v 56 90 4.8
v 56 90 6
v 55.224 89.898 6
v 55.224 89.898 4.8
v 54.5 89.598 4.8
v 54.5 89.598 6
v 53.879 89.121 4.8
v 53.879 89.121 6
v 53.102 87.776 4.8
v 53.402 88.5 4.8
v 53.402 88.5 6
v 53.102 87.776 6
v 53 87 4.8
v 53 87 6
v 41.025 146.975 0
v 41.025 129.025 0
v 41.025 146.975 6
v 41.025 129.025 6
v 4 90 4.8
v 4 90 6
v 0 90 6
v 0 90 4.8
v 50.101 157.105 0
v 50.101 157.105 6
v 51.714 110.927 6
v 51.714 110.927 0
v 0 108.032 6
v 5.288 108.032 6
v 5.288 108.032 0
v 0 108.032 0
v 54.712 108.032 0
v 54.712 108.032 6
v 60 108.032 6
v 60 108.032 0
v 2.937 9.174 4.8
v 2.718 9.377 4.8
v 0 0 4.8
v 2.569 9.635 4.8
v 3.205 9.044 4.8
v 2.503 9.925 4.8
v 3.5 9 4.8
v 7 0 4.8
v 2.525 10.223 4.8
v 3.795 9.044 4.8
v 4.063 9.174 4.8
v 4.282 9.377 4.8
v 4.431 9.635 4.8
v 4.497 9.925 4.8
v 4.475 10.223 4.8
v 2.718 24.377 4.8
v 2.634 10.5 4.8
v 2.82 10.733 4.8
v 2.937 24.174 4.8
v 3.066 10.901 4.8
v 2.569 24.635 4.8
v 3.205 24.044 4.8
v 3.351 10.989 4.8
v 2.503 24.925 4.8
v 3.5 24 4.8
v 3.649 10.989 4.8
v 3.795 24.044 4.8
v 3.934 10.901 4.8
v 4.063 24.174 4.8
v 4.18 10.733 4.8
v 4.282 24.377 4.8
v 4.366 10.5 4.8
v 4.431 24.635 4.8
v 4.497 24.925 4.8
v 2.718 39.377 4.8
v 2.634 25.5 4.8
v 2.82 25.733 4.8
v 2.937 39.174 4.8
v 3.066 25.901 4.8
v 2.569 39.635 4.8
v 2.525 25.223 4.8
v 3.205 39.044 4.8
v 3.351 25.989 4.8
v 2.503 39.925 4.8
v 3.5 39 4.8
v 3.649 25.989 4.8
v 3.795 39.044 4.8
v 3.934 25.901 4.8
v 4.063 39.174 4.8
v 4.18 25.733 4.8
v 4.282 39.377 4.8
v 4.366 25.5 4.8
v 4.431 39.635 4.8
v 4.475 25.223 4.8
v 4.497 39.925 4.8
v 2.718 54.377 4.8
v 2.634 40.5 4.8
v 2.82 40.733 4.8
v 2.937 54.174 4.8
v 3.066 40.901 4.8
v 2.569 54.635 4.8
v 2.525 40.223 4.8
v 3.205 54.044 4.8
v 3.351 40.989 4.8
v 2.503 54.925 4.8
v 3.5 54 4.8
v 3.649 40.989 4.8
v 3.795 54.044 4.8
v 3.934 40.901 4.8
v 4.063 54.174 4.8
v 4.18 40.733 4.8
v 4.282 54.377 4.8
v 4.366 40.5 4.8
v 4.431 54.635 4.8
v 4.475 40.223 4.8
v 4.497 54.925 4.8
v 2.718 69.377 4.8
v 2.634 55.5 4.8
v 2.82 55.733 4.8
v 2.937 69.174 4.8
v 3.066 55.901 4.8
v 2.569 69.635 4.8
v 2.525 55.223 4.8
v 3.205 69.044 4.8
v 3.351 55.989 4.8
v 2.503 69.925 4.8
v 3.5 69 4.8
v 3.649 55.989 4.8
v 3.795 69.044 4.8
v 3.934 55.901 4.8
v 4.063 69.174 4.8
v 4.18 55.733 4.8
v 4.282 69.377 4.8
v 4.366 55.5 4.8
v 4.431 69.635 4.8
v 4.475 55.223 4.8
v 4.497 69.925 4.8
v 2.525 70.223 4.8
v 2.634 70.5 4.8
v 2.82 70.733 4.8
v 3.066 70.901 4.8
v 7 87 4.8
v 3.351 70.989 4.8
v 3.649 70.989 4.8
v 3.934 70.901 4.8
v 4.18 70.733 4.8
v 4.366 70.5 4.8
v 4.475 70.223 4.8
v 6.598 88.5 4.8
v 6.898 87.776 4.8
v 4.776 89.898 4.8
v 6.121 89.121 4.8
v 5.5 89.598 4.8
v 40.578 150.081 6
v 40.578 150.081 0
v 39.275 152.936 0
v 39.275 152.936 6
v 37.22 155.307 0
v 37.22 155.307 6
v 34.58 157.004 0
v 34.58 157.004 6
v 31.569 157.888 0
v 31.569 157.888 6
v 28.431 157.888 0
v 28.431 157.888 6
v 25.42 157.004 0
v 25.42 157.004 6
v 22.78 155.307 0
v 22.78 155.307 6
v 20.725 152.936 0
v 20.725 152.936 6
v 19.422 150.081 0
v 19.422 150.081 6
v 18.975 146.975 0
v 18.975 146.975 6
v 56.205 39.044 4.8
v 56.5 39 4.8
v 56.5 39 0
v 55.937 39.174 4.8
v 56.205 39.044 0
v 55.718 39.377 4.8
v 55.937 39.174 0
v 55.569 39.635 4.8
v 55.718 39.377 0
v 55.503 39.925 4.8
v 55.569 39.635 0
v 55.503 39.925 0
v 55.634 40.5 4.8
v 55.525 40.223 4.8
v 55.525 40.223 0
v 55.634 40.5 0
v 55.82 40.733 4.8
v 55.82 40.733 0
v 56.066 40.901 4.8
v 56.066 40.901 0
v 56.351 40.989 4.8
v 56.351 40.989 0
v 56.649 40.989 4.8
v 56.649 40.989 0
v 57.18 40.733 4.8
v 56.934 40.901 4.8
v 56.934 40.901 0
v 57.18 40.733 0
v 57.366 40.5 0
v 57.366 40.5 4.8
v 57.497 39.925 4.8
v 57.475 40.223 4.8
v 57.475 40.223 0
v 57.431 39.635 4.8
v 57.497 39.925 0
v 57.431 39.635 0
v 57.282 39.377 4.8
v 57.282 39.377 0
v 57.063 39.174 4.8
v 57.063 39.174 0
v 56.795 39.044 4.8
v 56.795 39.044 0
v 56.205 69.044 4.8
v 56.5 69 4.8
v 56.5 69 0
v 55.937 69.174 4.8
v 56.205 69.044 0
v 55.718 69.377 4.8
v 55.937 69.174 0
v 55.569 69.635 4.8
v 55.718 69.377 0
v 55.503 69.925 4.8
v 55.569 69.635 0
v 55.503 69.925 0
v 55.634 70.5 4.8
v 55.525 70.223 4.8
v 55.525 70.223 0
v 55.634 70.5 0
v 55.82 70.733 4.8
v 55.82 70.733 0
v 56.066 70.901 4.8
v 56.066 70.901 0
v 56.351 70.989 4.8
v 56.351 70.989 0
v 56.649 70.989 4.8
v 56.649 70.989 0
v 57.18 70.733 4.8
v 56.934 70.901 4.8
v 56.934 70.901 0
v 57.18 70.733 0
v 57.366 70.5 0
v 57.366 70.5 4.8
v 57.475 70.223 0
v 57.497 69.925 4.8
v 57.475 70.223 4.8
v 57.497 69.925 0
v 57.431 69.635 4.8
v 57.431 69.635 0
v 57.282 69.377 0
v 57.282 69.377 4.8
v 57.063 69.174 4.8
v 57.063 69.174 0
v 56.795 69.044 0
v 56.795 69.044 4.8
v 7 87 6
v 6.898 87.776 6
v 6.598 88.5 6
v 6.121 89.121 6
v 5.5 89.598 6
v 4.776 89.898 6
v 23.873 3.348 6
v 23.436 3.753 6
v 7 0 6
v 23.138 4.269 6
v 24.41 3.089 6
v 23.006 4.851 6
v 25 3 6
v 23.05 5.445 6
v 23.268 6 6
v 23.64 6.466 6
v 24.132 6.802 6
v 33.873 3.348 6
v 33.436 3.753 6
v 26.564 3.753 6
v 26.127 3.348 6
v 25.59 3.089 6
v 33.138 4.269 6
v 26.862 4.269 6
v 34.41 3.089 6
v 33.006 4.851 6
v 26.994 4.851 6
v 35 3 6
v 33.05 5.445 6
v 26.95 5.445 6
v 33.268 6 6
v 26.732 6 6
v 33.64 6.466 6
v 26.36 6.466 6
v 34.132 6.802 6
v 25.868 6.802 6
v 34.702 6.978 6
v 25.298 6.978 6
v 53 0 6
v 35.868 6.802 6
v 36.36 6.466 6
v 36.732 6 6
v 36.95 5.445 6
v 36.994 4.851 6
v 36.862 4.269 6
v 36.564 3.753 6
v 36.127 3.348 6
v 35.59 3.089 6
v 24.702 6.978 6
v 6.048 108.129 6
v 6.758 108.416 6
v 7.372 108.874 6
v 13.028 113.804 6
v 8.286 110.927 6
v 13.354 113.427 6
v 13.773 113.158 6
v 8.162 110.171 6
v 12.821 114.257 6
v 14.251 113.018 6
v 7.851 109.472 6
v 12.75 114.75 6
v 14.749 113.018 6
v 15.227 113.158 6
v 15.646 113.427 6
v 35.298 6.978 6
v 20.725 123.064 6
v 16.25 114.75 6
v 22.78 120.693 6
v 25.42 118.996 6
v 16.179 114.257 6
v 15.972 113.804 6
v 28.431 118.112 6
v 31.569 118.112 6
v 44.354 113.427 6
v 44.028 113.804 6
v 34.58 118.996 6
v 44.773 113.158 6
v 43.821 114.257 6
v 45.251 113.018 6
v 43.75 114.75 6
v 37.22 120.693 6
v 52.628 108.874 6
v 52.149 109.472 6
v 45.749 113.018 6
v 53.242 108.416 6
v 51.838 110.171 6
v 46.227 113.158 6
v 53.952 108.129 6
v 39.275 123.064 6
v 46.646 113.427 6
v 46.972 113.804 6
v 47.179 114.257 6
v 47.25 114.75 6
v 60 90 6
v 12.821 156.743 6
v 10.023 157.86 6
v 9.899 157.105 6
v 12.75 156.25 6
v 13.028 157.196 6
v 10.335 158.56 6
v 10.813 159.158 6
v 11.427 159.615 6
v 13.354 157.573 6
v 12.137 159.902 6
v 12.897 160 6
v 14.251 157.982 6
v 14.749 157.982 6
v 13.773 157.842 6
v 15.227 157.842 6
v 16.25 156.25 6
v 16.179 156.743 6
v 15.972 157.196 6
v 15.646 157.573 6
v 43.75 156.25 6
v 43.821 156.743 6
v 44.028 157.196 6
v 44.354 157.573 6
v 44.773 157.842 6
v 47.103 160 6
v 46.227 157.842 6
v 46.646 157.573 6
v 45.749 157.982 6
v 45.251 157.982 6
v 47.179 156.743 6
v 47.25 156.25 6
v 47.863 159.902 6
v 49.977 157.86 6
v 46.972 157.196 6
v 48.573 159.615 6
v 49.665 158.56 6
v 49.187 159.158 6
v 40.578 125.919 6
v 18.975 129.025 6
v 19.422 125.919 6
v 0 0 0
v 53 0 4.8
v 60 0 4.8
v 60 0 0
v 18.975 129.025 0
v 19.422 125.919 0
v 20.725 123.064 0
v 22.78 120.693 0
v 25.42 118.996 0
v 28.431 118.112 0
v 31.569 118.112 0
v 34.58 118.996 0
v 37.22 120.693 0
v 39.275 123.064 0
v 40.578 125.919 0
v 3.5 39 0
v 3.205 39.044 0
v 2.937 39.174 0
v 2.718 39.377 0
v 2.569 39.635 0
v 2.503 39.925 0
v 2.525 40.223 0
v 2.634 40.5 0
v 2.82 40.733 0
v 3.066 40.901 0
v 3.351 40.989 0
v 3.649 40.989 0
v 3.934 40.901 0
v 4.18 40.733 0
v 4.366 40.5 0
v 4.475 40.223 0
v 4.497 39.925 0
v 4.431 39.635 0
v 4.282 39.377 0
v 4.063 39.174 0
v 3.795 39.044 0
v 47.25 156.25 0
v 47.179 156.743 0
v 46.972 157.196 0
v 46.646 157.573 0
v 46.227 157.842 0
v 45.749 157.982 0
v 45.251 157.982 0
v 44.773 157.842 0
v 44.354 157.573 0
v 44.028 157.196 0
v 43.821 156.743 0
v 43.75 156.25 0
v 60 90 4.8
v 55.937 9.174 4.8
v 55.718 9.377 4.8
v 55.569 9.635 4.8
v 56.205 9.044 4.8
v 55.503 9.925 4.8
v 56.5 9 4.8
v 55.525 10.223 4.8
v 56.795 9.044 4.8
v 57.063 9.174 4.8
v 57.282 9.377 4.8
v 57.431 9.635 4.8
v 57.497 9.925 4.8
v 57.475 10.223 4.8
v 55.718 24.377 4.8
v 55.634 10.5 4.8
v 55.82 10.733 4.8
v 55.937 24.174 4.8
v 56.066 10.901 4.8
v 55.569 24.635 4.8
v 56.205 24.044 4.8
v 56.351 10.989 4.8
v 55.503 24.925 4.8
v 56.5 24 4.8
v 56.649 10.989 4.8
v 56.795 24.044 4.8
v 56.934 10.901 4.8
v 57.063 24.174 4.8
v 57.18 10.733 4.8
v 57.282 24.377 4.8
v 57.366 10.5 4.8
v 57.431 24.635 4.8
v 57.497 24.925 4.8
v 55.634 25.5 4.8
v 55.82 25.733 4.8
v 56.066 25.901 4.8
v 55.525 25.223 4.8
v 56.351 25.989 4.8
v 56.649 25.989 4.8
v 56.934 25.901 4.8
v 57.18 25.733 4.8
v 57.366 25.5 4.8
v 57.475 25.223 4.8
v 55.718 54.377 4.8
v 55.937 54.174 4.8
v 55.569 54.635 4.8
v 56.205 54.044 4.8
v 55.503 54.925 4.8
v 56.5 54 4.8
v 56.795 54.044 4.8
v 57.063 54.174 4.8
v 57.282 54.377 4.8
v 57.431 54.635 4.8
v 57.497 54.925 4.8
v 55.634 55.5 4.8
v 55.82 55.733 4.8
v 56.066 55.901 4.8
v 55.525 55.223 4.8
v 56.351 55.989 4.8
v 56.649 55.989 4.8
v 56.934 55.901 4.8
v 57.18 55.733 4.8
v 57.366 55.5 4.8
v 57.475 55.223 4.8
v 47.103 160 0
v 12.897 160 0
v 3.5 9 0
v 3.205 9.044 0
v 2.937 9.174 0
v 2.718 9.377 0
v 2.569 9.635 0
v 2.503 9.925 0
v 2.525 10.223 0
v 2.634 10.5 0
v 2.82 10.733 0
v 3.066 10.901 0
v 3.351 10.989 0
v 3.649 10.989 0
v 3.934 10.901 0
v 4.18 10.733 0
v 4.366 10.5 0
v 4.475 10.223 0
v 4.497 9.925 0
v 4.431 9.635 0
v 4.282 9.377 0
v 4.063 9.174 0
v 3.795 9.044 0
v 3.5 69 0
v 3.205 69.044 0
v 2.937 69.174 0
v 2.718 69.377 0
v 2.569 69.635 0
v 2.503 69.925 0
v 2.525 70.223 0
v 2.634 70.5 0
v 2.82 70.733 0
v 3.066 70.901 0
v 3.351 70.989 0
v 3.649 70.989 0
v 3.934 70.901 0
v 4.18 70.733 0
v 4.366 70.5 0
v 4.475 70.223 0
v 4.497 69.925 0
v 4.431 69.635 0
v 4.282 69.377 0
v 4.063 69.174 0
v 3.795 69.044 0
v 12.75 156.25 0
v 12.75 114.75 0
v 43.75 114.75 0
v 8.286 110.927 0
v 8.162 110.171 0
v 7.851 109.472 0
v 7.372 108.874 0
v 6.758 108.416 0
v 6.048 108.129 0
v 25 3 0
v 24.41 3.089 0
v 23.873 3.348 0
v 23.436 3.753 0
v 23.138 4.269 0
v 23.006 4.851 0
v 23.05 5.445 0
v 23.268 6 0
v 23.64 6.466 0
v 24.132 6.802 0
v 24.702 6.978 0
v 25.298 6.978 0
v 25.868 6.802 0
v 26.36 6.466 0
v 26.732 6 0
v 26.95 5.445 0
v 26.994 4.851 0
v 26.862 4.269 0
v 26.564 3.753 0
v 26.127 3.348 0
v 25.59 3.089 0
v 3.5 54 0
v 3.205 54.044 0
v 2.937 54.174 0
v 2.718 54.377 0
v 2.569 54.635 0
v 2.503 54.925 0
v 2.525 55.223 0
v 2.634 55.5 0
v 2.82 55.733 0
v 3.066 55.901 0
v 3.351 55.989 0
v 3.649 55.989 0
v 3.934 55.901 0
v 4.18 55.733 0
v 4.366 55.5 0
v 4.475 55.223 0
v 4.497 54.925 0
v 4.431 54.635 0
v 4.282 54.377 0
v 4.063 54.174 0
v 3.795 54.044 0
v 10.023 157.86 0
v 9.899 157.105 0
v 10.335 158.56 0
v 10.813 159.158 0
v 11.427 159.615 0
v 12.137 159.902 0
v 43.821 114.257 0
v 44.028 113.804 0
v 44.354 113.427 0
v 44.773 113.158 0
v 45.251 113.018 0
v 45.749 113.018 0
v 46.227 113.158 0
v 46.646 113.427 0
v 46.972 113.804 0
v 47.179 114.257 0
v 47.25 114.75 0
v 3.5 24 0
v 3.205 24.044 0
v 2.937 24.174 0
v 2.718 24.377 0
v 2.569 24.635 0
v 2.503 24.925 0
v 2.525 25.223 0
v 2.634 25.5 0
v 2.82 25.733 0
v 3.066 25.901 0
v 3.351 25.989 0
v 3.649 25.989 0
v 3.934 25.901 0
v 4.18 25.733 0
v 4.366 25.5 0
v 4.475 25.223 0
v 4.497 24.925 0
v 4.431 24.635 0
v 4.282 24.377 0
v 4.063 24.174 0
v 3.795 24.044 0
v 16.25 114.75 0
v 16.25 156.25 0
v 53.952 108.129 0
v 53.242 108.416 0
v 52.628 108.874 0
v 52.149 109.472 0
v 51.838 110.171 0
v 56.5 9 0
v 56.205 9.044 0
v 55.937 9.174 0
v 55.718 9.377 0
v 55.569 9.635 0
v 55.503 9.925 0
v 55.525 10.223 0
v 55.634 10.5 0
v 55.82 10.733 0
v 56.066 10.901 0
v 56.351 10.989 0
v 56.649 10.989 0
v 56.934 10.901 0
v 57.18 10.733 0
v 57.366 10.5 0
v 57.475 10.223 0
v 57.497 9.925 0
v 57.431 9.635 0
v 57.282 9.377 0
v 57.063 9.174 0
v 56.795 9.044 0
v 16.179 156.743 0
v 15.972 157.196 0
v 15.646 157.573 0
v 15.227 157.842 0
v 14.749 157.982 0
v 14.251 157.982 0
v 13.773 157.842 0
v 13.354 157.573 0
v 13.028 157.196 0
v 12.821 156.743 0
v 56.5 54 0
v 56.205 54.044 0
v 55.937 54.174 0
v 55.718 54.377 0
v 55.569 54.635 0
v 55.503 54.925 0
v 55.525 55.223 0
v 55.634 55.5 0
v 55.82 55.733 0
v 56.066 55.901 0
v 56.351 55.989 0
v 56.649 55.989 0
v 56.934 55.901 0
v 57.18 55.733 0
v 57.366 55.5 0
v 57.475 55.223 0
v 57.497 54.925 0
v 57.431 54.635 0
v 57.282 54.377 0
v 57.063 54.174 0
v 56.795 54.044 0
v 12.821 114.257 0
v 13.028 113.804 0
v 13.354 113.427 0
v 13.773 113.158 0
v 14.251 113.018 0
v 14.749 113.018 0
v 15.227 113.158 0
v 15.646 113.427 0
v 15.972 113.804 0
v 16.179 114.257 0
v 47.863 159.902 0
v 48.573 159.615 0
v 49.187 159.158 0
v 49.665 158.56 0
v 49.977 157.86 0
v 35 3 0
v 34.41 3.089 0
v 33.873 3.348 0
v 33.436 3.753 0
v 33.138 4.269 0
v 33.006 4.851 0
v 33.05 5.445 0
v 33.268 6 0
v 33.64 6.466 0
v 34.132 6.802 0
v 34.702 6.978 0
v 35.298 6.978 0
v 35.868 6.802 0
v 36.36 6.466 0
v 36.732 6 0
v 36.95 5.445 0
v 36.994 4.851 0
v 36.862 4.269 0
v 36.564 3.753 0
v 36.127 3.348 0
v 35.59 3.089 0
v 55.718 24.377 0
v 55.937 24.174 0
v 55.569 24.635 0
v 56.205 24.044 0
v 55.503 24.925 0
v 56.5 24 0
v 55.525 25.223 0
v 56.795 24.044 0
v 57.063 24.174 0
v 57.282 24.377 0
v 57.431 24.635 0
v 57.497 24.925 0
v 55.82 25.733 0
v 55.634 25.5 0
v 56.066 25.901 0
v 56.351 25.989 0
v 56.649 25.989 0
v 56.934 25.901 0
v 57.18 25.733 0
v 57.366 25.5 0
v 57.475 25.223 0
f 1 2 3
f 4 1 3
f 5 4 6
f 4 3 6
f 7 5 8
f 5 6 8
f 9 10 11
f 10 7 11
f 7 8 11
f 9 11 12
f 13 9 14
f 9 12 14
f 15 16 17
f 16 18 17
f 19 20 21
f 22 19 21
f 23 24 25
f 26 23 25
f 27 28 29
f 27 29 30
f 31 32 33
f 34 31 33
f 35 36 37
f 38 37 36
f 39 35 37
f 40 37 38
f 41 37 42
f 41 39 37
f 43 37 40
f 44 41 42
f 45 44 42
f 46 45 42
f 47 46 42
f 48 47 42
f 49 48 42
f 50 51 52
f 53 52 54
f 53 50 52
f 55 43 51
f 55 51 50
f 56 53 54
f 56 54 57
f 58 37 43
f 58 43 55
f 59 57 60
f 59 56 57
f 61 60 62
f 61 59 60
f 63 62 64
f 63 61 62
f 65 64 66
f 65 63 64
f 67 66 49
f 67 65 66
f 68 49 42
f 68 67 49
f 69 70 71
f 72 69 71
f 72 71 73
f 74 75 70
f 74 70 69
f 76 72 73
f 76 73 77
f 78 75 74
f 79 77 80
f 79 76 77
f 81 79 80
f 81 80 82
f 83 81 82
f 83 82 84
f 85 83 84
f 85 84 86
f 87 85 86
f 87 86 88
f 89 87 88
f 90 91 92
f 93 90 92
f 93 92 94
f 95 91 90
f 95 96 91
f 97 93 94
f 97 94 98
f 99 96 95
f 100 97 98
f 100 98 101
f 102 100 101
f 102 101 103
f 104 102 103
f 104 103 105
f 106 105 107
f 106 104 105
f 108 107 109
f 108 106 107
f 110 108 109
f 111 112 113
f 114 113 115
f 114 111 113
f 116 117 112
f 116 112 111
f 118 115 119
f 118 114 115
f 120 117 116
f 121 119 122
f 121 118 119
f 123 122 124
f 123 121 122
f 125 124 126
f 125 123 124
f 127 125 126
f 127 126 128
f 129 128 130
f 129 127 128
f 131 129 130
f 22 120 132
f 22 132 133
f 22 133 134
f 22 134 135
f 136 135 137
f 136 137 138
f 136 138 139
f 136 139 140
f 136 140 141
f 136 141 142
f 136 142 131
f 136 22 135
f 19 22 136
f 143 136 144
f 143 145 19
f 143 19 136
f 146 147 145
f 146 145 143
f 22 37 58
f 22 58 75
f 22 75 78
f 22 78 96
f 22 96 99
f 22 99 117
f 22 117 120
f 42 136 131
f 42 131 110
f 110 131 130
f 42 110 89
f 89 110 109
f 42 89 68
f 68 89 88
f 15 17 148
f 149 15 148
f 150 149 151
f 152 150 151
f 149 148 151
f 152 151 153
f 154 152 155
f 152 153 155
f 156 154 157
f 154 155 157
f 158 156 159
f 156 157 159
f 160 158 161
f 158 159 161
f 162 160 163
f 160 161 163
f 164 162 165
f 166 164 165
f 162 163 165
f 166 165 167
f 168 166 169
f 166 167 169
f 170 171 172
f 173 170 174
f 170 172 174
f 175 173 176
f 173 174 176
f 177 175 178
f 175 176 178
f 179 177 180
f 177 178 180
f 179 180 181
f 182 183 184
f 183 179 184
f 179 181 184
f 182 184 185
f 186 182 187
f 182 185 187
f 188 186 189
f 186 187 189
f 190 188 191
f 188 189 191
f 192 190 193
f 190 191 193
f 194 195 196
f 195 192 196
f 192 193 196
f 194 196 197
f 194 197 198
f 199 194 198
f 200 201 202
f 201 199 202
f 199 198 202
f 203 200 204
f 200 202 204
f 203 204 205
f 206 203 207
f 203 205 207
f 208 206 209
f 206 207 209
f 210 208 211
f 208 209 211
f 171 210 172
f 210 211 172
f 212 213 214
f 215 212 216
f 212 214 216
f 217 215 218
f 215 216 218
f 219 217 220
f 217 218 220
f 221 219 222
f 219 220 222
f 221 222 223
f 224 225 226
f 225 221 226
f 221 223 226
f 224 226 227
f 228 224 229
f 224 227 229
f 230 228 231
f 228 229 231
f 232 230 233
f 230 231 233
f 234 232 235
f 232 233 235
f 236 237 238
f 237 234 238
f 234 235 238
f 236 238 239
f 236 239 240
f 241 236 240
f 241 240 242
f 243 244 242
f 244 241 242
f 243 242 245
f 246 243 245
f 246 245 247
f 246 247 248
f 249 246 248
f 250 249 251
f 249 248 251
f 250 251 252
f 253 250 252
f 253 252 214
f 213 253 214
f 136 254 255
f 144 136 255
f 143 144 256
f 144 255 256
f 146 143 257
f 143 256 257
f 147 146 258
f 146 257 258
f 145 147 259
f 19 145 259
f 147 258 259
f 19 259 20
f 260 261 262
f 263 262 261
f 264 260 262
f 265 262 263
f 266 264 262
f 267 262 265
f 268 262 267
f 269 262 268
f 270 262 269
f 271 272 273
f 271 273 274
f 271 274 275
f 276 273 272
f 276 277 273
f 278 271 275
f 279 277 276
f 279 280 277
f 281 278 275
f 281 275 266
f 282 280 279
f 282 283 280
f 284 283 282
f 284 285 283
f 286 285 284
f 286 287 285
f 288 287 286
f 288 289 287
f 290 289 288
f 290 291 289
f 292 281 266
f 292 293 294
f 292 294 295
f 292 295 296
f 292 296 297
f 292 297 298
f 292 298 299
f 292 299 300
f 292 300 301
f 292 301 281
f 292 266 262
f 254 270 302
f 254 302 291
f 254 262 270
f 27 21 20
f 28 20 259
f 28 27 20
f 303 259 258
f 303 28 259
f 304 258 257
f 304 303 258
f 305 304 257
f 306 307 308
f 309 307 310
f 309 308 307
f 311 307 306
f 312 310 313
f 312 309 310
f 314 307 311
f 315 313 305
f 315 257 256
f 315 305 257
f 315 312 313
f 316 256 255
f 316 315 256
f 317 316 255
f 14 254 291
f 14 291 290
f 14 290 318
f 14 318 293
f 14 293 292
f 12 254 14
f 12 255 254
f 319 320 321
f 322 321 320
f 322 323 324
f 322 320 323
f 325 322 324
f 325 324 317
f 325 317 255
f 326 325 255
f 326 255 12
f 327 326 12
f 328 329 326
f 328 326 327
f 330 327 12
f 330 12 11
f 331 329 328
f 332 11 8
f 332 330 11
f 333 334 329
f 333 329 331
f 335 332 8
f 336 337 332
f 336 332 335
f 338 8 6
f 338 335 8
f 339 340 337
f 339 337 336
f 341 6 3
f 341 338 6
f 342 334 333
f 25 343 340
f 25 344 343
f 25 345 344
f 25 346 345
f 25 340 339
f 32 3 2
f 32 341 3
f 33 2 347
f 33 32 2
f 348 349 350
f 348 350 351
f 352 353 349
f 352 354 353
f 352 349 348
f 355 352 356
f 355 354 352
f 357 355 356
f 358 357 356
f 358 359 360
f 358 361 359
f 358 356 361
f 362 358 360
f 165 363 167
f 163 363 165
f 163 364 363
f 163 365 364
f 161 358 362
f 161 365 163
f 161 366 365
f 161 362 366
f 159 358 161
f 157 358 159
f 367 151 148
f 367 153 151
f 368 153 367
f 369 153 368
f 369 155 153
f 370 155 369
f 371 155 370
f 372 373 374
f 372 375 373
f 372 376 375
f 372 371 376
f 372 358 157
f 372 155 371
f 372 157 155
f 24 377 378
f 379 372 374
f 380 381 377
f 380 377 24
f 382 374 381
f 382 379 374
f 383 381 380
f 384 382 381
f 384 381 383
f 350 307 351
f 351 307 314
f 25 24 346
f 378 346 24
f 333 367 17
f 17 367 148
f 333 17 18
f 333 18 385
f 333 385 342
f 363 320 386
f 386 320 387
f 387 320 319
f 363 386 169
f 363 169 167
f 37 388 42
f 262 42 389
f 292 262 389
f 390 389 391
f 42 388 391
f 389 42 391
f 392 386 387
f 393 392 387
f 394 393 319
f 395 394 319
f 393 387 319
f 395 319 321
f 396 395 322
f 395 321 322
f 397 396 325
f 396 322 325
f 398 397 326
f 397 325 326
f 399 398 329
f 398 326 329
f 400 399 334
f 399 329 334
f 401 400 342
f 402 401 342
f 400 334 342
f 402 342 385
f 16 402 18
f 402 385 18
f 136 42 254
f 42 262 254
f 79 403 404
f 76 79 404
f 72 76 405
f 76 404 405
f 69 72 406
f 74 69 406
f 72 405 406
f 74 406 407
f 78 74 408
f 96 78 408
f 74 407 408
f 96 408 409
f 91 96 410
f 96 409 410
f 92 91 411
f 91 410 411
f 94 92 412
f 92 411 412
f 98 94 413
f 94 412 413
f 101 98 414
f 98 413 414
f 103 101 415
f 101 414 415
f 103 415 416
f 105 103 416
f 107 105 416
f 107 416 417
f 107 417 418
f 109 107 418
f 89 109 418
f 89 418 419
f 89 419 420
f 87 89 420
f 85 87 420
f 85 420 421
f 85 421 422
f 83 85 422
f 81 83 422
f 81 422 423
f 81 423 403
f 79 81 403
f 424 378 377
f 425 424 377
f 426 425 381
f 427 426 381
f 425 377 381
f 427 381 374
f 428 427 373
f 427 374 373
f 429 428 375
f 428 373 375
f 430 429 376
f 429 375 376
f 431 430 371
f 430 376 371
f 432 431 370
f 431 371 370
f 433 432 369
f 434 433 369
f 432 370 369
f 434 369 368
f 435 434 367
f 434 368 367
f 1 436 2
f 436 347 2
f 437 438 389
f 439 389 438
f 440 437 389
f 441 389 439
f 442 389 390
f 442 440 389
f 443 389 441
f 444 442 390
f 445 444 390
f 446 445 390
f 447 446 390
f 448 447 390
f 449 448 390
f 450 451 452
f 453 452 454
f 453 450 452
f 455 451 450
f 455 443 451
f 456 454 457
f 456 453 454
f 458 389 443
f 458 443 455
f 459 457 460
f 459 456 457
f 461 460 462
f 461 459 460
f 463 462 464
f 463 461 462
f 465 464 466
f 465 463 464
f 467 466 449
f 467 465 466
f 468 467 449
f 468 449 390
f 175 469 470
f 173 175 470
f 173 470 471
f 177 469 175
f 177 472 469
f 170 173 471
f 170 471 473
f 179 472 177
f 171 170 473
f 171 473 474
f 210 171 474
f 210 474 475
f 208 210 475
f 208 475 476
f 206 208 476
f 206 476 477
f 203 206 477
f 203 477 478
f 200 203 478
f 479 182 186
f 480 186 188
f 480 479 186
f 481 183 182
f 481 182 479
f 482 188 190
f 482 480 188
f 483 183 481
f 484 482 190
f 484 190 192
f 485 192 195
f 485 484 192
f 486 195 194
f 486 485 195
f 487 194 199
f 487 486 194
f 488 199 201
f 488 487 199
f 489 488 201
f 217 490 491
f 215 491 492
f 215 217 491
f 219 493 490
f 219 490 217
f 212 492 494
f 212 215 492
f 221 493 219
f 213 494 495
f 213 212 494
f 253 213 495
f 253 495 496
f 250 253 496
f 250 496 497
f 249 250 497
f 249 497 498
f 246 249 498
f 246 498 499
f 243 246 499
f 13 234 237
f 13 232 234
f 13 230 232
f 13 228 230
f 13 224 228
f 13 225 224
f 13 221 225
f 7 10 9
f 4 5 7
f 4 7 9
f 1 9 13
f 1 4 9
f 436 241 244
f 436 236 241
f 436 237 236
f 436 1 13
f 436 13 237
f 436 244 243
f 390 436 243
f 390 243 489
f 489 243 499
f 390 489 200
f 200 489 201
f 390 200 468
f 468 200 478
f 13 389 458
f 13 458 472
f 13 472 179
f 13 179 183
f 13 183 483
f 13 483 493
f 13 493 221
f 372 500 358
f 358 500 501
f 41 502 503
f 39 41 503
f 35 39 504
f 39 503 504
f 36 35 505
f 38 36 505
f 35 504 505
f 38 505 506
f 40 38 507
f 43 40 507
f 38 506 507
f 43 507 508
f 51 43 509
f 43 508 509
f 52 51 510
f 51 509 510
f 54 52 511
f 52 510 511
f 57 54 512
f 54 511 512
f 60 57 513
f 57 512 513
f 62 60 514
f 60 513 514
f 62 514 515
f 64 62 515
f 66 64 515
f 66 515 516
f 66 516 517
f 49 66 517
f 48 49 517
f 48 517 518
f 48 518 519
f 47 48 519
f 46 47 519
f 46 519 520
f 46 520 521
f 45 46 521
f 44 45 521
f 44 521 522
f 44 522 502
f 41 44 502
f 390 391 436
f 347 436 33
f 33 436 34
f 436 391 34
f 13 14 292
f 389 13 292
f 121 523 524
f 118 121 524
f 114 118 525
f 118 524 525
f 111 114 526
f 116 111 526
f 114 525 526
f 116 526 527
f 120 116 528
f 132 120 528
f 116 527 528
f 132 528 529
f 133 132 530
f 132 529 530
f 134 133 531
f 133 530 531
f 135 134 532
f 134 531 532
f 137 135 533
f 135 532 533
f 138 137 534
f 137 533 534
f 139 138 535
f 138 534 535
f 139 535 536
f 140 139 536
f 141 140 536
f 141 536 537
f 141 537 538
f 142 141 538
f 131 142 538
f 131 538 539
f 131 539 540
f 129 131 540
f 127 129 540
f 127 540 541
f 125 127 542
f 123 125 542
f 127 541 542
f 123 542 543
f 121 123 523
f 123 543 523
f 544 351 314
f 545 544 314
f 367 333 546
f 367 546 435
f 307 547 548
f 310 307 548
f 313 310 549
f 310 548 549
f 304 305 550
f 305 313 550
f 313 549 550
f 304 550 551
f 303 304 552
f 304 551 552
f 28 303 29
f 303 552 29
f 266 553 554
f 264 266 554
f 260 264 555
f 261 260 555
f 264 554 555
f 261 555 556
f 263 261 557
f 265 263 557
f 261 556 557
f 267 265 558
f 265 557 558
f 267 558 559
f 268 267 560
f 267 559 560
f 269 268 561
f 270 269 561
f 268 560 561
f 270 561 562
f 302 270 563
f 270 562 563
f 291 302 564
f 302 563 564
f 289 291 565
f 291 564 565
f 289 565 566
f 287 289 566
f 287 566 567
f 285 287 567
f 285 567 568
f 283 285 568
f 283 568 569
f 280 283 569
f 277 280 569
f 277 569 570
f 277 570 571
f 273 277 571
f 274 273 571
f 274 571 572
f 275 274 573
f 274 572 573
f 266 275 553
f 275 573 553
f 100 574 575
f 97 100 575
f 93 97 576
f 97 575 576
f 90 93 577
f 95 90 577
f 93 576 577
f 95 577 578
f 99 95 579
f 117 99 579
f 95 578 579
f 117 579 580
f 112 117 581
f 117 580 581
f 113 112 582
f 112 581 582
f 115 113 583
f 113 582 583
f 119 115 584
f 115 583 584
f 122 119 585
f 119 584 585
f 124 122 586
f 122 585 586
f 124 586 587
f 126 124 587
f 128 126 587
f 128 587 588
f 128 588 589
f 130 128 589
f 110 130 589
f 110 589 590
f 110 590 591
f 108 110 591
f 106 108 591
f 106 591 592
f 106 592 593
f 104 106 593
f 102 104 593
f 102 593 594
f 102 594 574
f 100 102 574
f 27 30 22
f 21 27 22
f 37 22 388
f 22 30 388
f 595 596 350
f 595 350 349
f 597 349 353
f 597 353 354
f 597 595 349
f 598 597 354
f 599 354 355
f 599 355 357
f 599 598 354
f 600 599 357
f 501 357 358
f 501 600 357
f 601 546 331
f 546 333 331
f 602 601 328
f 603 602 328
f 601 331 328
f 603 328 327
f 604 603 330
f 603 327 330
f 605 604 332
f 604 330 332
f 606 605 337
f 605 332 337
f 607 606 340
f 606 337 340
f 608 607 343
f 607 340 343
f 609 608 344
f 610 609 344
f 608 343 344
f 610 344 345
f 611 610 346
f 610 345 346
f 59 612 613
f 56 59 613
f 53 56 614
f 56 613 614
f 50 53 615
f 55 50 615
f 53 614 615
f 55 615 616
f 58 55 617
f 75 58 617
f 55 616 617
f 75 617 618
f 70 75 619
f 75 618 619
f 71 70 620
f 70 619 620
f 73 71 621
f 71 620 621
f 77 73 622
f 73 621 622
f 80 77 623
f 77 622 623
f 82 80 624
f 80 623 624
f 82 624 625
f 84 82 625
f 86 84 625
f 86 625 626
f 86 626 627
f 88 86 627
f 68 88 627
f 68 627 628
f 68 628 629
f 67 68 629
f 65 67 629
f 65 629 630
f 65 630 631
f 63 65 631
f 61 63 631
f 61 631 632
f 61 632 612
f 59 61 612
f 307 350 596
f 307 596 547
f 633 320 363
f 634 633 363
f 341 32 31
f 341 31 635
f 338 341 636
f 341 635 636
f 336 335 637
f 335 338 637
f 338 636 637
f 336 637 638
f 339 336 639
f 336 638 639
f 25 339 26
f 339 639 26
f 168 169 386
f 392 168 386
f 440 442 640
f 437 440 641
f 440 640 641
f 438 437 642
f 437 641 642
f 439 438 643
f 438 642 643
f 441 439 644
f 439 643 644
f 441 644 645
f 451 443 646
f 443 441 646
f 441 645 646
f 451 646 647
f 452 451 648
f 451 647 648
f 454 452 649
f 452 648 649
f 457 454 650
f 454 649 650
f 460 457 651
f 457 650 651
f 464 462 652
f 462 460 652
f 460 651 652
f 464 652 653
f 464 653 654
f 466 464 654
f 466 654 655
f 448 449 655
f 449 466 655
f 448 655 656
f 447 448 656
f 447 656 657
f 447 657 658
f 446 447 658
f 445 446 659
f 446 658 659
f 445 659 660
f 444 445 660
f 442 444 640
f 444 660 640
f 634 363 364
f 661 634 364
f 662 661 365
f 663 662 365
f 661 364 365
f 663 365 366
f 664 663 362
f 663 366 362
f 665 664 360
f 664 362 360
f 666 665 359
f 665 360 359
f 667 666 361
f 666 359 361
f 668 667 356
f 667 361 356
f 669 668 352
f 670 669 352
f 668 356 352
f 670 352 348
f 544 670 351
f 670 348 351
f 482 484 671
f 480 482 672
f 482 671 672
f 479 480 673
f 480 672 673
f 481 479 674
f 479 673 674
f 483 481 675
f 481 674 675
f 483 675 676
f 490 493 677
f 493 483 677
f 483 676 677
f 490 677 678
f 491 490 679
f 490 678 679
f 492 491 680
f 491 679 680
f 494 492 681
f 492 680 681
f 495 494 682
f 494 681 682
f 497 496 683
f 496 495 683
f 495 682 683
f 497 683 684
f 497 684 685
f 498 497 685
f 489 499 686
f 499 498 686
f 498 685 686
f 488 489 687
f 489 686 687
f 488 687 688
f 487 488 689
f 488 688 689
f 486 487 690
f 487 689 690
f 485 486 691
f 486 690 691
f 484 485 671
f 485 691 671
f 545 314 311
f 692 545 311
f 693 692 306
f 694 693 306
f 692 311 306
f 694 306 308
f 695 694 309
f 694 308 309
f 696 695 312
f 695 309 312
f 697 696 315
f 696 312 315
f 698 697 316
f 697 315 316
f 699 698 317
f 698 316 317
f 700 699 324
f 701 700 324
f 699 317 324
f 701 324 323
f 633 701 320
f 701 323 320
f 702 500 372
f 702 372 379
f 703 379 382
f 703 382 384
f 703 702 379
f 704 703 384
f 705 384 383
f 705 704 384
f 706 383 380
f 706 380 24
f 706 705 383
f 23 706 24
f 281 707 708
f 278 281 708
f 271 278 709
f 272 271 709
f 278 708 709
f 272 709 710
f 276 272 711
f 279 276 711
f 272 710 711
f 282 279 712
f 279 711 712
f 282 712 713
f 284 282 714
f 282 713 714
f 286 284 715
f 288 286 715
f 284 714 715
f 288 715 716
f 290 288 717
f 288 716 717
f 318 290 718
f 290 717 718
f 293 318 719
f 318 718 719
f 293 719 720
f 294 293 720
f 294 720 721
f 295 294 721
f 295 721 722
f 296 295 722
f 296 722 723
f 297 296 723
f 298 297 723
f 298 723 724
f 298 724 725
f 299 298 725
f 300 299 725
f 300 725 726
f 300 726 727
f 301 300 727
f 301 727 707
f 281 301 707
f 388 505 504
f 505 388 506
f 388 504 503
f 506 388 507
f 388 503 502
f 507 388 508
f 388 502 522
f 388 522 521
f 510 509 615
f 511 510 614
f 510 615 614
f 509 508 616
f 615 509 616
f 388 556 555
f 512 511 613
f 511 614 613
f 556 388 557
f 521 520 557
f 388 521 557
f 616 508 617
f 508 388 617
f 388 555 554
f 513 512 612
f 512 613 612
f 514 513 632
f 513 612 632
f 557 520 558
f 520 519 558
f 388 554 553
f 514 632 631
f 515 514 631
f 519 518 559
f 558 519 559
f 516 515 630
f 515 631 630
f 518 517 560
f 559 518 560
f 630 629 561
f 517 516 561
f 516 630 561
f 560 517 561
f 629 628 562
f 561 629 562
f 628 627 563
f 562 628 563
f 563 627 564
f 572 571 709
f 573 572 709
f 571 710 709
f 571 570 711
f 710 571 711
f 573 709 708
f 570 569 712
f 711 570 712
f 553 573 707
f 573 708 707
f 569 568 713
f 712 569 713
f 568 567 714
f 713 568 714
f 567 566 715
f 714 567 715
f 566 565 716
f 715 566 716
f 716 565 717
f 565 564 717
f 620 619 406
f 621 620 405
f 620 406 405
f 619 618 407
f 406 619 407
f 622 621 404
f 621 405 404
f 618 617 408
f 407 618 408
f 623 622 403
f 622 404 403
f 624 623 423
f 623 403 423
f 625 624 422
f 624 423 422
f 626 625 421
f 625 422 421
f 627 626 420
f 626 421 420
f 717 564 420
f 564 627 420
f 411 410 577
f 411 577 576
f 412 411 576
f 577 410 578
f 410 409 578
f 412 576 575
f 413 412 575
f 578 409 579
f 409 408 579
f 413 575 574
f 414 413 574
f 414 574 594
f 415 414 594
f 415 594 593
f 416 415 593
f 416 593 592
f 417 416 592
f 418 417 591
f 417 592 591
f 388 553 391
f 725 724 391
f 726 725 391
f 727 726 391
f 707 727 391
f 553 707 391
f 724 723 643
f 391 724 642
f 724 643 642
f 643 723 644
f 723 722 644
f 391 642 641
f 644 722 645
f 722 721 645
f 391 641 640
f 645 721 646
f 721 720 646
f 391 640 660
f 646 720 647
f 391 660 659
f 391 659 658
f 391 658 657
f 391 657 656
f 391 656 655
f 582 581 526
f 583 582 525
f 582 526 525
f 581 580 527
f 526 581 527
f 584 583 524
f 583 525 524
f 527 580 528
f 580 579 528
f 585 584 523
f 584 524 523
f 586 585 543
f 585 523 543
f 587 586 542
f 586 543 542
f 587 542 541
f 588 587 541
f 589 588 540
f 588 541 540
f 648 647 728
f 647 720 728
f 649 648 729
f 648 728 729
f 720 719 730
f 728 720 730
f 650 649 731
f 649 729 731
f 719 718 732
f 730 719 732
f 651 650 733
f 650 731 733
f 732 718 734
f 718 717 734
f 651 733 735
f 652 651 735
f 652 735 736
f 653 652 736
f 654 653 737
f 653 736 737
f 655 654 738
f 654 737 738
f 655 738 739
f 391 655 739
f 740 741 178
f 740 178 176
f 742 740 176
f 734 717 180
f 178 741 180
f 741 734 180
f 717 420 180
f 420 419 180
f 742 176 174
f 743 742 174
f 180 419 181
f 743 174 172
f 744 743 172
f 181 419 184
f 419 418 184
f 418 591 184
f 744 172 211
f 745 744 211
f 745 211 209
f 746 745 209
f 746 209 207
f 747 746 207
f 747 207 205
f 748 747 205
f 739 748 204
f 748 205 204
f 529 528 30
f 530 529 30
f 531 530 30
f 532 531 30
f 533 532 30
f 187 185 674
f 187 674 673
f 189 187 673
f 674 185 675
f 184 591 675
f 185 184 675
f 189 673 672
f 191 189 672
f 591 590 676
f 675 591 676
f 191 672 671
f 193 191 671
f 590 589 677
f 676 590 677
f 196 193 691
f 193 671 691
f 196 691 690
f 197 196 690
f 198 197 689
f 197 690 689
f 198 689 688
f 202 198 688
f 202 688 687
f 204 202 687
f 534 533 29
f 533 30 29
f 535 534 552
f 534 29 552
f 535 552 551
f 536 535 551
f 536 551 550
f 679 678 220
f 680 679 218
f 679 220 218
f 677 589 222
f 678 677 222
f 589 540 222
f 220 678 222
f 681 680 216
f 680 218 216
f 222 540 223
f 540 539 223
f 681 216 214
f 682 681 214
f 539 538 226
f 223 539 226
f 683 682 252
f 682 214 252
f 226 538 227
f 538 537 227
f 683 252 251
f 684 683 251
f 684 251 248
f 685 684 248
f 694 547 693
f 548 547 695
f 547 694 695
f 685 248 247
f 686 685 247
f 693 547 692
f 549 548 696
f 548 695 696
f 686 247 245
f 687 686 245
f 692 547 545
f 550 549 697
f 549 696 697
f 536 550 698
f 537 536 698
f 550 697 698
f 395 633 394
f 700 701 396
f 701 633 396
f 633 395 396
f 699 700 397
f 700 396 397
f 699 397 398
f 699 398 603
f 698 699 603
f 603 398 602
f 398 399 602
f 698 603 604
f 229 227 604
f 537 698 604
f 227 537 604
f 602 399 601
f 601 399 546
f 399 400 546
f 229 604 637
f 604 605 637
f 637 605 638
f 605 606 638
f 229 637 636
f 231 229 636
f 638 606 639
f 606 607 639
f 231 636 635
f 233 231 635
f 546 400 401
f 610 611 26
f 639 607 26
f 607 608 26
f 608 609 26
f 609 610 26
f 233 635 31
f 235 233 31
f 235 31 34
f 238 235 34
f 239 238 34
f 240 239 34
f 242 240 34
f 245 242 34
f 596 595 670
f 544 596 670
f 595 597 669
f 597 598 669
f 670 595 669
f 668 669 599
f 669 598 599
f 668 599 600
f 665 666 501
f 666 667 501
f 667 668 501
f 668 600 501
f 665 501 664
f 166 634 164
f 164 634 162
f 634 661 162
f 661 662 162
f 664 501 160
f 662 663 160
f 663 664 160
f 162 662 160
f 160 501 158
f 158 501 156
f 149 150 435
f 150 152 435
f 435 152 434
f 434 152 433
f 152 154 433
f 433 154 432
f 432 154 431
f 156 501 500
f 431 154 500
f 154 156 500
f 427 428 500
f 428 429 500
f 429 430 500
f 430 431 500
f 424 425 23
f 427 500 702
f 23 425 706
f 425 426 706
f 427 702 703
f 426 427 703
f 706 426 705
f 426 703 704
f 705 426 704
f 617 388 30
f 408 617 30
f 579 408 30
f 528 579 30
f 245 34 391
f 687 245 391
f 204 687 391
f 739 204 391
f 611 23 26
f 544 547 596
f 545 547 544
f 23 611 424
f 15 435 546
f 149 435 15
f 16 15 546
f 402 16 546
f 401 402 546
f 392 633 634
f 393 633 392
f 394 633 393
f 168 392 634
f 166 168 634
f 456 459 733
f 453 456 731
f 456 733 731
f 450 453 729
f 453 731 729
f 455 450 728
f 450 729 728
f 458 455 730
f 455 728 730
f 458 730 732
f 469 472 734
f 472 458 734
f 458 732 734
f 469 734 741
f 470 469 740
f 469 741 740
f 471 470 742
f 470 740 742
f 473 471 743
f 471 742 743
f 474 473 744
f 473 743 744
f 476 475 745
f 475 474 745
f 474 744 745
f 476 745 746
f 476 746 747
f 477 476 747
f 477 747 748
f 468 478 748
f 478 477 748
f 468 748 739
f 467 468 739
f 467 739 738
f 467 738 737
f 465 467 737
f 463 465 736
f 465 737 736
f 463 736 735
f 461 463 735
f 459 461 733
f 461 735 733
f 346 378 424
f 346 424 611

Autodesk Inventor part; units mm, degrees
ref_plane "YZ Plane" through (0, 0, 0) normal (1, 0, 0) x (0, 1, 0)
ref_plane "XZ Plane" through (0, 0, 0) normal (0, 1, 0) x (-1, 0, 0)
ref_plane "XY Plane" through (0, 0, 0) normal (0, 0, 1) x (1, 0, 0)
sketch "Sketch1" plane through (0, 0, 0) normal (0, 0, 1) x (1, 0, 0)
  line L0 (0, 0) -> (60, 0)
  line L1 (60, 0) -> (60, 160)
  line L2 (60, 160) -> (0, 160)
  line L3 (0, 160) -> (0, 0)
  dimension "d0" = 60
  dimension "d1" = 160
extrude "Extrusion1" add sketch "Sketch1" along normal blind 6
sketch "Sketch2" plane through (0, 0, 6) normal (0, 0, 1) x (1, 0, 0)
  line L0 (30, 170) -> (30, -10) construction
  line L1 (14.5, 170) -> (14.5, -10) construction
  line L2 (30, 158) -> (30, 118) construction
  line L3 (18.975, 146.975) -> (18.975, 129.025)
  line L4 (41.025, 129.025) -> (41.025, 146.975)
  arc A0 (41.025, 146.975) -> (18.975, 146.975) centre (30, 146.975) ccw
  arc A1 (18.975, 129.025) -> (41.025, 129.025) centre (30, 129.025) ccw
  line L5 (14.5, 158) -> (14.5, 113) construction
  line L6 (12.75, 156.25) -> (12.75, 114.75)
  line L7 (16.25, 114.75) -> (16.25, 156.25)
  arc A2 (16.25, 156.25) -> (12.75, 156.25) centre (14.5, 156.25) ccw
  arc A3 (12.75, 114.75) -> (16.25, 114.75) centre (14.5, 114.75) ccw
  line L8 (45.5, 158) -> (45.5, 113) construction
  line L9 (47.25, 156.25) -> (47.25, 114.75)
  line L10 (43.75, 114.75) -> (43.75, 156.25)
  arc A4 (47.25, 156.25) -> (43.75, 156.25) centre (45.5, 156.25) ccw
  arc A5 (43.75, 114.75) -> (47.25, 114.75) centre (45.5, 114.75) ccw
  point P0 (0, 0)
  point P1 (30, 138)
  point P2 (14.5, 135.5)
  point P3 (45.5, 135.5)
  dimension "d5" = 15.5
  dimension "d6" = 40
  dimension "d7" = 22.05
  dimension "d8" = 45
  dimension "d9" = 3.5
extrude "Extrusion2" cut sketch "Sketch2" against normal through all
sketch "Sketch3" plane through (0, 0, 6) normal (0, 0, 1) x (1, 0, 0)
  line L0 (60, 160) -> (0, 160) projected
  line L1 (30, 160) -> (30, 60)
  line L2 (10, 160) -> (8.1852, 108.0317)
  line L3 (10, 160) -> (62, 160) construction
  line L4 (8.1852, 108.0317) -> (0, 108.0317)
  line L5 (0, 160) -> (0, 0) projected
  line L6 (10, 160) -> (0, 160)
  line L7 (0, 160) -> (0, 108.0317)
  line L8 (50, 160) -> (51.8148, 108.0317)
  line L9 (51.8148, 108.0317) -> (60, 108.0317)
  line L10 (50, 160) -> (60, 160)
  line L11 (60, 160) -> (60, 108.0317)
  dimension "d12" = 100
  dimension "d13" = 52
  dimension "d14" = 92
  dimension "d15" = 92
extrude "Extrusion3" cut sketch "Sketch3" against normal through all
fillet "Fillet1" radius 3 4 edges at (51.8148, 108.0317, 3) (50, 160, 3) (10, 160, 3) (8.1852, 108.0317, 3)
sketch "Sketch4" plane through (0, 0, 6) normal (0, 0, 1) x (1, 0, 0)
  line L0 (30, 0) -> (30, 50)
  line L1 (0, 0) -> (60, 0) projected
  line L2 (0, 0) -> (7, 0)
  line L3 (7, 0) -> (7, 87)
  line L4 (4, 90) -> (0, 90)
  line L5 (0, 90) -> (0, 0)
  arc A0 (7, 87) -> (4, 90) centre (4, 87) ccw
  point P0 (25, 5)
  point P1 (35, 5)
  point P2 (7, 90)
  dimension "d27" = 7
  dimension "d28" = 90
  dimension "d29" = 3
hole "Hole1" at (25, 5, 6) at (35, 5, 6) direction (0, 0, -1) diameter 4 end through all
extrude "Extrusion4" cut sketch "Sketch4" against normal blind 1.2
sketch "Sketch6" plane through (0, 0, 4.8) normal (0, 0, 1) x (1, 0, 0)
  line L0 (7, 0) -> (0, 0) projected
  line L1 (0, 108.0317) -> (0, 0) projected
  point P0 (3.5, 10)
  point P1 (3.5, 25)
  point P2 (3.5, 40)
  point P3 (3.5, 55)
  point P4 (3.5, 70)
  dimension "d32" = 10
  dimension "d33" = 3.5
  dimension "d36" = 15
hole "Hole2" at (3.5, 10, 4.8) at (3.5, 25, 4.8) at (3.5, 40, 4.8) at (3.5, 55, 4.8) at (3.5, 70, 4.8) direction (0, 0, -1) diameter 2 end through all
ref_plane "Work Plane1" through (30, 0, 6) normal (1, 0, 0) x (0, 1, 0)
mirror "Mirror1" about plane through (30, 0, 6) normal (1, 0, 0) of "Extrusion4", "Hole2"
ref_plane "Work Plane2" through (30, 0, 6) normal (1, 0, 0) x (0, 1, 0)
properties part number "Z-baseplate" material "Aluminum 6061"
